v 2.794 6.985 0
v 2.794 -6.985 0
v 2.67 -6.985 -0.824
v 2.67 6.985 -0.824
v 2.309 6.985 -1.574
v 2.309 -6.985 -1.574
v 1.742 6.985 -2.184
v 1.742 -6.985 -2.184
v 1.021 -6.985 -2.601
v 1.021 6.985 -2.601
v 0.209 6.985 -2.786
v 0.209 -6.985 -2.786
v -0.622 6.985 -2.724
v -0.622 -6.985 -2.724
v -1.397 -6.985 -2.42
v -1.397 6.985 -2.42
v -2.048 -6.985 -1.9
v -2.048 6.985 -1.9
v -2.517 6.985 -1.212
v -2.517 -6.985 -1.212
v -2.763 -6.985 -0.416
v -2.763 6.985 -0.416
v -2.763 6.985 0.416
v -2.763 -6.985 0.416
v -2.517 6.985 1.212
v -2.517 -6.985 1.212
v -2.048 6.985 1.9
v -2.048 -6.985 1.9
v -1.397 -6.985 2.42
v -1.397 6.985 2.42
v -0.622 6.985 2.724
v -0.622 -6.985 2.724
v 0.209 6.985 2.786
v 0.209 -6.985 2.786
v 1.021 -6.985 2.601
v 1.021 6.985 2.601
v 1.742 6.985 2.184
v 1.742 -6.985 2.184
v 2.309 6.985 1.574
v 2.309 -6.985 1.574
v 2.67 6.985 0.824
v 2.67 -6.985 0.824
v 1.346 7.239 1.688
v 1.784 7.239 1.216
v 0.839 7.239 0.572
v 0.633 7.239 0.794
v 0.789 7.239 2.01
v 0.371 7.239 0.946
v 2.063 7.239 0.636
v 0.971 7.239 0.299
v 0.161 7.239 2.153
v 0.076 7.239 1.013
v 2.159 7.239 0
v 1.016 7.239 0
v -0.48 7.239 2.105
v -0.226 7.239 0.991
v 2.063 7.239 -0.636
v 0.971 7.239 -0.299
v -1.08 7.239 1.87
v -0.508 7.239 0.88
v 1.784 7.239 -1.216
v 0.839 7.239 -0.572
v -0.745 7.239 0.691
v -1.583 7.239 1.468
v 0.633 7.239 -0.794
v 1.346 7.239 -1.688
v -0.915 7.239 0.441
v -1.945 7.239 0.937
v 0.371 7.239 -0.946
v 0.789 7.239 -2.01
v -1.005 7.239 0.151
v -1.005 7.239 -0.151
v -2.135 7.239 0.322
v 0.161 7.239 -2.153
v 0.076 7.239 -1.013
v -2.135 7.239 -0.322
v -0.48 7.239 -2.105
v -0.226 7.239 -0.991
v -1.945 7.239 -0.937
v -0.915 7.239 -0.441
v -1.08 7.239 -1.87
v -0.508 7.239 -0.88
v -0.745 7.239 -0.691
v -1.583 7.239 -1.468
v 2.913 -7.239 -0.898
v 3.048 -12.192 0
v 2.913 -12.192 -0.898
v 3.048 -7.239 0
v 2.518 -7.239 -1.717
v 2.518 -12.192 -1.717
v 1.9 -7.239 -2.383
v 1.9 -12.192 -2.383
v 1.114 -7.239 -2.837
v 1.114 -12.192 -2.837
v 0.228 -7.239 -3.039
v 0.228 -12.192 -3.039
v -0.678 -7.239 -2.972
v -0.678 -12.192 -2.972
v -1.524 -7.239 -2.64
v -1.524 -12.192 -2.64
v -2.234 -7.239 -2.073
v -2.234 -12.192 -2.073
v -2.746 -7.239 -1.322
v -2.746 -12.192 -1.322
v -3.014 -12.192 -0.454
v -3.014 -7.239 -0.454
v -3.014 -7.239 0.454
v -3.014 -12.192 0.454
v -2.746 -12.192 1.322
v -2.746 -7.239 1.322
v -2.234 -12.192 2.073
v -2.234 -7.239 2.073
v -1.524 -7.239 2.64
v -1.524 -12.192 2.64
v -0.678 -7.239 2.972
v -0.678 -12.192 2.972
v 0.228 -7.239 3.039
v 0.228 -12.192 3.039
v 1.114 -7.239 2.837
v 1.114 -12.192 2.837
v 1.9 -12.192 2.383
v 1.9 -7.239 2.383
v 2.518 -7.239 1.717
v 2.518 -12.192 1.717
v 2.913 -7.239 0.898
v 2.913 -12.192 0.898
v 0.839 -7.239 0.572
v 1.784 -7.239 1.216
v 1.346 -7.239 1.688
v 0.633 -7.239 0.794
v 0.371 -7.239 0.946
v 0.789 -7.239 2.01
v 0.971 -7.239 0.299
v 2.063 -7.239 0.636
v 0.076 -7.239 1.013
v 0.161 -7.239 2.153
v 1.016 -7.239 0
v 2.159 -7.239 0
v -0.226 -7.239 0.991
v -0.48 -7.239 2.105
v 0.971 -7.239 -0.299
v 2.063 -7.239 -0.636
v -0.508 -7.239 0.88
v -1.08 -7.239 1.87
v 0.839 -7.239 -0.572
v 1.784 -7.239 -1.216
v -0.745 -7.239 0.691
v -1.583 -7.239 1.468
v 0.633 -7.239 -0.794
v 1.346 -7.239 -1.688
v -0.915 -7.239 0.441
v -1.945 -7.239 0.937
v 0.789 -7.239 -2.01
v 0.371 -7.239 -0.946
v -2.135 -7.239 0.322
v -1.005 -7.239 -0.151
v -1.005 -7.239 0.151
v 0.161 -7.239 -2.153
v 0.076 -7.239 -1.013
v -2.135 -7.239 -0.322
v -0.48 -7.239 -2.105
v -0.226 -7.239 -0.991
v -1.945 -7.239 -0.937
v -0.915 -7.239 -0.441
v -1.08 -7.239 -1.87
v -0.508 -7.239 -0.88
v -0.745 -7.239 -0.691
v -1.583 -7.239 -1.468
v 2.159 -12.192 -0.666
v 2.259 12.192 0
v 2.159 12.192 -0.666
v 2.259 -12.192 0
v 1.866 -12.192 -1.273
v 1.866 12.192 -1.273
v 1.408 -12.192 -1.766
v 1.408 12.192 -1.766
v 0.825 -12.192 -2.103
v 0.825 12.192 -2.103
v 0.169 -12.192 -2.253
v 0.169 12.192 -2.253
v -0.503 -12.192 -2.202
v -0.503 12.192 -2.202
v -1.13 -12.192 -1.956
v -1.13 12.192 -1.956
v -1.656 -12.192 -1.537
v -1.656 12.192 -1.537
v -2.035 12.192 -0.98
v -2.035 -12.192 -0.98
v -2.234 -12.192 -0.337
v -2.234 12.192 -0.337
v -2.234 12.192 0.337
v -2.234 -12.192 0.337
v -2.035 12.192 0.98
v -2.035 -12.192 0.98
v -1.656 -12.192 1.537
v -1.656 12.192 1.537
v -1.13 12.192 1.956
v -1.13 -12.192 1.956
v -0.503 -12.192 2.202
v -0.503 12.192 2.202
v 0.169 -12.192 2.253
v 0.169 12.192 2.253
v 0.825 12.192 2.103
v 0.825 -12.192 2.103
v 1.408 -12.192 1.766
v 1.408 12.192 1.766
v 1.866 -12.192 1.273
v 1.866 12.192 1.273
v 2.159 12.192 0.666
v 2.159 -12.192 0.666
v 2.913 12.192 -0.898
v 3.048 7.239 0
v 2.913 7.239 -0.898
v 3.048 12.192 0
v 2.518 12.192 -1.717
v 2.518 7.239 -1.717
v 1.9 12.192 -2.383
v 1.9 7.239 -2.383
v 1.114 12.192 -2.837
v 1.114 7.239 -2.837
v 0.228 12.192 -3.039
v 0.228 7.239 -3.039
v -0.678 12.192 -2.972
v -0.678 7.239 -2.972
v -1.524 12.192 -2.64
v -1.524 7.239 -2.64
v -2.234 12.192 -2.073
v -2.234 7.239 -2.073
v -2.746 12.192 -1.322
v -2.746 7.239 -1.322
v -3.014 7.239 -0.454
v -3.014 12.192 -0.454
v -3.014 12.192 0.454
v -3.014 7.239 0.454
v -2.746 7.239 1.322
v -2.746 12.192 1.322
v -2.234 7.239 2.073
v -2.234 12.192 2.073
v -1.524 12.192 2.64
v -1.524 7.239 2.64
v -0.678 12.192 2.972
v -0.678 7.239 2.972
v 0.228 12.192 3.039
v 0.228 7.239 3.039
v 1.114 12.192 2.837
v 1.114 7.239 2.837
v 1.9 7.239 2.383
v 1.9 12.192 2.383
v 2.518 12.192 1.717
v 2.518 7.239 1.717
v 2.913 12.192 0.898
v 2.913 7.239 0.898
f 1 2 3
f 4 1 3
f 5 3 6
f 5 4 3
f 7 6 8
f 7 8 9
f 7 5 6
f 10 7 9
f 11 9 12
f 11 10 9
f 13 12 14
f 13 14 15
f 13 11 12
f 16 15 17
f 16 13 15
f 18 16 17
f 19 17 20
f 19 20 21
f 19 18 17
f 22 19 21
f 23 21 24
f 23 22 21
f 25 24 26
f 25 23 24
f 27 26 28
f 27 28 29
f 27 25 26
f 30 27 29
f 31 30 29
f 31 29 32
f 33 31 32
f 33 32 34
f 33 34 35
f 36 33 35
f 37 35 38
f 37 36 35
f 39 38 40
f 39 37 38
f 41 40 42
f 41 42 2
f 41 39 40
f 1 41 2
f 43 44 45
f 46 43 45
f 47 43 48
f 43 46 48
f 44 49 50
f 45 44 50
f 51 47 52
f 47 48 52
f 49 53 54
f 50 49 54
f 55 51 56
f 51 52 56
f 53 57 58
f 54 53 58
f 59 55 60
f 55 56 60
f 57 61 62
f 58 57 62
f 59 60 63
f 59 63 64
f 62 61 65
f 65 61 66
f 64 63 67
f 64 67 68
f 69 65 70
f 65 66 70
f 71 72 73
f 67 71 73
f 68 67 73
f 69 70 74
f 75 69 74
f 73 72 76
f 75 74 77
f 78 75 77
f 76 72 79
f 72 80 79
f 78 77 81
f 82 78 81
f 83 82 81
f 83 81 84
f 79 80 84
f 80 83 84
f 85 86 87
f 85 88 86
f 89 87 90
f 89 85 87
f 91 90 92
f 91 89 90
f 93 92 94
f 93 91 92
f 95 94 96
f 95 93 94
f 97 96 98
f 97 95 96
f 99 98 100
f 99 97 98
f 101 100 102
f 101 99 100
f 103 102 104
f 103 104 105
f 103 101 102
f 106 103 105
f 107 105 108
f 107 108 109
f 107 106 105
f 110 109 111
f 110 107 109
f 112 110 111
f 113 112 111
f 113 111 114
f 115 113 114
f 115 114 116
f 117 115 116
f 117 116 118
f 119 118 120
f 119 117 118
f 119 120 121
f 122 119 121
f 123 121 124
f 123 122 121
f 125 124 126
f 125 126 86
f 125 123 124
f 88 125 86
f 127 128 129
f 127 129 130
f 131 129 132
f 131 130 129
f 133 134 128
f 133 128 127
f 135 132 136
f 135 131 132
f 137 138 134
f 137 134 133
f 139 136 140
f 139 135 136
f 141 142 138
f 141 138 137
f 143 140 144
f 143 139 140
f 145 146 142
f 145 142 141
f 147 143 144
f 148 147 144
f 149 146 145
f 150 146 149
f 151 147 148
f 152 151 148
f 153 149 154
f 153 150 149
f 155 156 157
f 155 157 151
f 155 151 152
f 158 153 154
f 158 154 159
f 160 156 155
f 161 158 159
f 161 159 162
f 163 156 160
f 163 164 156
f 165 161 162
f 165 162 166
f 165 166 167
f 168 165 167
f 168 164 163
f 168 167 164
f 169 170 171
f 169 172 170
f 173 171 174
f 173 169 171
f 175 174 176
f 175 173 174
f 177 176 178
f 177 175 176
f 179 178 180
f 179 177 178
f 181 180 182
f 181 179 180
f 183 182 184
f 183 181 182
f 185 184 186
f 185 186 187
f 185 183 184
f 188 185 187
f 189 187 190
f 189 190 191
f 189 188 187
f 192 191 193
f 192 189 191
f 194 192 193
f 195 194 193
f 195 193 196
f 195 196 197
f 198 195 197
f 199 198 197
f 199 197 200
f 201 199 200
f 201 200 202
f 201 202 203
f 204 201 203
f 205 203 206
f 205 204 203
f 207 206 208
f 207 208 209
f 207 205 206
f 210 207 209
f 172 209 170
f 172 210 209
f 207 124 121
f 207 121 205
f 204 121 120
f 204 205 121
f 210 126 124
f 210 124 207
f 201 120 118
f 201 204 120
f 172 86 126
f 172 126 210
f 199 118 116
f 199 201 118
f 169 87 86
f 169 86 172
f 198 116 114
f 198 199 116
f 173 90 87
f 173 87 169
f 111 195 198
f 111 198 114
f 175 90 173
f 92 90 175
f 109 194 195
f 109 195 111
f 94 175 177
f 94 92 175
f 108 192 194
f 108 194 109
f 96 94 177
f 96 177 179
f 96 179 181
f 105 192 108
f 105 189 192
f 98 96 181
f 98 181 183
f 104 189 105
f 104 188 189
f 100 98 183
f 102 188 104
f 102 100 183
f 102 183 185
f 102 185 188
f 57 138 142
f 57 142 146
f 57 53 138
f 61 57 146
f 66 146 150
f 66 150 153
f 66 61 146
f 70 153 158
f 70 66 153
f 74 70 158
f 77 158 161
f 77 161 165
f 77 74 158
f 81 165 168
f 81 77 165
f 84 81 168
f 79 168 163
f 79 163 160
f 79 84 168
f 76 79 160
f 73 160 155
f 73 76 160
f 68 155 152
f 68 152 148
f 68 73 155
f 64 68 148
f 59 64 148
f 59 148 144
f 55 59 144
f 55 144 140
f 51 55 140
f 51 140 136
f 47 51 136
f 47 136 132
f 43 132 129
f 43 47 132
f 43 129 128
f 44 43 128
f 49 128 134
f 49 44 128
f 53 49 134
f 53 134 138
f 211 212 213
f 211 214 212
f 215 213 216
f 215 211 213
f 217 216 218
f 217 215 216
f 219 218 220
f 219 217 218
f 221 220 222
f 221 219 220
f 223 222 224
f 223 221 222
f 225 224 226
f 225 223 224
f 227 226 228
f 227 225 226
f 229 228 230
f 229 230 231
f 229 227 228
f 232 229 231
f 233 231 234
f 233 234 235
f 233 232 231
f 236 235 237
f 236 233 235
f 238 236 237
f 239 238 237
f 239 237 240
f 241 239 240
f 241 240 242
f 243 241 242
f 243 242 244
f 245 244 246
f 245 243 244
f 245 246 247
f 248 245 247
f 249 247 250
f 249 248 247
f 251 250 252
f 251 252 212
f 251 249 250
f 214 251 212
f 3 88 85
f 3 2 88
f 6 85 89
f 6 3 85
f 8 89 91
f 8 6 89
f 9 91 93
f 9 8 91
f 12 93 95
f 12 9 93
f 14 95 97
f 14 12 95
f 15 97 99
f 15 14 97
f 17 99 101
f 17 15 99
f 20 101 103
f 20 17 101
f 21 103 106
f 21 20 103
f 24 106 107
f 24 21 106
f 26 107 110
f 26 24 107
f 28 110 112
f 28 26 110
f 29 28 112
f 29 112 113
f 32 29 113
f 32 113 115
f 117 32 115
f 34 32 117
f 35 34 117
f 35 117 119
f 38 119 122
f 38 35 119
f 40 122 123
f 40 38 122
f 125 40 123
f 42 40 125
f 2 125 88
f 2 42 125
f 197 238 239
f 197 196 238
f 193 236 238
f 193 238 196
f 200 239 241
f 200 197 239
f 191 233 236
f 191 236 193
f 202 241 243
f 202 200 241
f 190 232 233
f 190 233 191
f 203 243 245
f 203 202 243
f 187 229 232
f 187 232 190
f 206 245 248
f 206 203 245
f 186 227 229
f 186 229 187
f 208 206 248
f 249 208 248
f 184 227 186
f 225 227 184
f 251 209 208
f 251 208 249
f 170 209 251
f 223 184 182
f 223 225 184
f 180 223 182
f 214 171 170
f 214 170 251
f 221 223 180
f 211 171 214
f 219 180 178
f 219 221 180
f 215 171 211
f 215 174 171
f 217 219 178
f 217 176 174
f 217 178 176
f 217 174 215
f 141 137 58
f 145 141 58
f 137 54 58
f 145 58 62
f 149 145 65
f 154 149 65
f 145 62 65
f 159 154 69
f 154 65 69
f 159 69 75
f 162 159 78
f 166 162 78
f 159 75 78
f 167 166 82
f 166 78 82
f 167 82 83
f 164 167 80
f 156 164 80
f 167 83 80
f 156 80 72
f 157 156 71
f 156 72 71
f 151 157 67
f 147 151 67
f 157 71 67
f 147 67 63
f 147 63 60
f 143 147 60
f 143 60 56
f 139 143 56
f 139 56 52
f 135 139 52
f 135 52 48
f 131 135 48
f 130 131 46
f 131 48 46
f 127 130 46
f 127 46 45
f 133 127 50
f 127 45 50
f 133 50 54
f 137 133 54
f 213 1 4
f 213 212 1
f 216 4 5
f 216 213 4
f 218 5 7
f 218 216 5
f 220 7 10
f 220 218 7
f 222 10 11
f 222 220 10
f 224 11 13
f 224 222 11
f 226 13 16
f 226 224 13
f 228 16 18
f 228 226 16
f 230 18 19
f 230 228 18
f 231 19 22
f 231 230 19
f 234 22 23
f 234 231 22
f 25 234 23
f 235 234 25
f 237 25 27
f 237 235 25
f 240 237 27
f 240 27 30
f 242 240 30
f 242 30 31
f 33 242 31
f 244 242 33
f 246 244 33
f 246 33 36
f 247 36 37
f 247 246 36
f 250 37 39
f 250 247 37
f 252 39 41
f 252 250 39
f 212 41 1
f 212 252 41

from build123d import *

# Parameters (mm, degrees)
SKETCH1_W = 1.143
SKETCH1_H = 14.478


with BuildPart() as part:
    # Sketch1 → Revolve1 (revolve)
    with BuildSketch(Plane.XY):
        Polygon((2.259, 12.192), (2.259, -12.192), (3.048, -12.192), (3.048, -7.239), (2.794, -6.985), (2.794, 6.985), (3.048, 7.239), (3.048, 12.192), align=None)
        with Locations((1.5875, 0)):
            Rectangle(SKETCH1_W, SKETCH1_H)
    revolve(axis=Axis((0, 0, 0), (0, 1, 0)))


solid = part.part
